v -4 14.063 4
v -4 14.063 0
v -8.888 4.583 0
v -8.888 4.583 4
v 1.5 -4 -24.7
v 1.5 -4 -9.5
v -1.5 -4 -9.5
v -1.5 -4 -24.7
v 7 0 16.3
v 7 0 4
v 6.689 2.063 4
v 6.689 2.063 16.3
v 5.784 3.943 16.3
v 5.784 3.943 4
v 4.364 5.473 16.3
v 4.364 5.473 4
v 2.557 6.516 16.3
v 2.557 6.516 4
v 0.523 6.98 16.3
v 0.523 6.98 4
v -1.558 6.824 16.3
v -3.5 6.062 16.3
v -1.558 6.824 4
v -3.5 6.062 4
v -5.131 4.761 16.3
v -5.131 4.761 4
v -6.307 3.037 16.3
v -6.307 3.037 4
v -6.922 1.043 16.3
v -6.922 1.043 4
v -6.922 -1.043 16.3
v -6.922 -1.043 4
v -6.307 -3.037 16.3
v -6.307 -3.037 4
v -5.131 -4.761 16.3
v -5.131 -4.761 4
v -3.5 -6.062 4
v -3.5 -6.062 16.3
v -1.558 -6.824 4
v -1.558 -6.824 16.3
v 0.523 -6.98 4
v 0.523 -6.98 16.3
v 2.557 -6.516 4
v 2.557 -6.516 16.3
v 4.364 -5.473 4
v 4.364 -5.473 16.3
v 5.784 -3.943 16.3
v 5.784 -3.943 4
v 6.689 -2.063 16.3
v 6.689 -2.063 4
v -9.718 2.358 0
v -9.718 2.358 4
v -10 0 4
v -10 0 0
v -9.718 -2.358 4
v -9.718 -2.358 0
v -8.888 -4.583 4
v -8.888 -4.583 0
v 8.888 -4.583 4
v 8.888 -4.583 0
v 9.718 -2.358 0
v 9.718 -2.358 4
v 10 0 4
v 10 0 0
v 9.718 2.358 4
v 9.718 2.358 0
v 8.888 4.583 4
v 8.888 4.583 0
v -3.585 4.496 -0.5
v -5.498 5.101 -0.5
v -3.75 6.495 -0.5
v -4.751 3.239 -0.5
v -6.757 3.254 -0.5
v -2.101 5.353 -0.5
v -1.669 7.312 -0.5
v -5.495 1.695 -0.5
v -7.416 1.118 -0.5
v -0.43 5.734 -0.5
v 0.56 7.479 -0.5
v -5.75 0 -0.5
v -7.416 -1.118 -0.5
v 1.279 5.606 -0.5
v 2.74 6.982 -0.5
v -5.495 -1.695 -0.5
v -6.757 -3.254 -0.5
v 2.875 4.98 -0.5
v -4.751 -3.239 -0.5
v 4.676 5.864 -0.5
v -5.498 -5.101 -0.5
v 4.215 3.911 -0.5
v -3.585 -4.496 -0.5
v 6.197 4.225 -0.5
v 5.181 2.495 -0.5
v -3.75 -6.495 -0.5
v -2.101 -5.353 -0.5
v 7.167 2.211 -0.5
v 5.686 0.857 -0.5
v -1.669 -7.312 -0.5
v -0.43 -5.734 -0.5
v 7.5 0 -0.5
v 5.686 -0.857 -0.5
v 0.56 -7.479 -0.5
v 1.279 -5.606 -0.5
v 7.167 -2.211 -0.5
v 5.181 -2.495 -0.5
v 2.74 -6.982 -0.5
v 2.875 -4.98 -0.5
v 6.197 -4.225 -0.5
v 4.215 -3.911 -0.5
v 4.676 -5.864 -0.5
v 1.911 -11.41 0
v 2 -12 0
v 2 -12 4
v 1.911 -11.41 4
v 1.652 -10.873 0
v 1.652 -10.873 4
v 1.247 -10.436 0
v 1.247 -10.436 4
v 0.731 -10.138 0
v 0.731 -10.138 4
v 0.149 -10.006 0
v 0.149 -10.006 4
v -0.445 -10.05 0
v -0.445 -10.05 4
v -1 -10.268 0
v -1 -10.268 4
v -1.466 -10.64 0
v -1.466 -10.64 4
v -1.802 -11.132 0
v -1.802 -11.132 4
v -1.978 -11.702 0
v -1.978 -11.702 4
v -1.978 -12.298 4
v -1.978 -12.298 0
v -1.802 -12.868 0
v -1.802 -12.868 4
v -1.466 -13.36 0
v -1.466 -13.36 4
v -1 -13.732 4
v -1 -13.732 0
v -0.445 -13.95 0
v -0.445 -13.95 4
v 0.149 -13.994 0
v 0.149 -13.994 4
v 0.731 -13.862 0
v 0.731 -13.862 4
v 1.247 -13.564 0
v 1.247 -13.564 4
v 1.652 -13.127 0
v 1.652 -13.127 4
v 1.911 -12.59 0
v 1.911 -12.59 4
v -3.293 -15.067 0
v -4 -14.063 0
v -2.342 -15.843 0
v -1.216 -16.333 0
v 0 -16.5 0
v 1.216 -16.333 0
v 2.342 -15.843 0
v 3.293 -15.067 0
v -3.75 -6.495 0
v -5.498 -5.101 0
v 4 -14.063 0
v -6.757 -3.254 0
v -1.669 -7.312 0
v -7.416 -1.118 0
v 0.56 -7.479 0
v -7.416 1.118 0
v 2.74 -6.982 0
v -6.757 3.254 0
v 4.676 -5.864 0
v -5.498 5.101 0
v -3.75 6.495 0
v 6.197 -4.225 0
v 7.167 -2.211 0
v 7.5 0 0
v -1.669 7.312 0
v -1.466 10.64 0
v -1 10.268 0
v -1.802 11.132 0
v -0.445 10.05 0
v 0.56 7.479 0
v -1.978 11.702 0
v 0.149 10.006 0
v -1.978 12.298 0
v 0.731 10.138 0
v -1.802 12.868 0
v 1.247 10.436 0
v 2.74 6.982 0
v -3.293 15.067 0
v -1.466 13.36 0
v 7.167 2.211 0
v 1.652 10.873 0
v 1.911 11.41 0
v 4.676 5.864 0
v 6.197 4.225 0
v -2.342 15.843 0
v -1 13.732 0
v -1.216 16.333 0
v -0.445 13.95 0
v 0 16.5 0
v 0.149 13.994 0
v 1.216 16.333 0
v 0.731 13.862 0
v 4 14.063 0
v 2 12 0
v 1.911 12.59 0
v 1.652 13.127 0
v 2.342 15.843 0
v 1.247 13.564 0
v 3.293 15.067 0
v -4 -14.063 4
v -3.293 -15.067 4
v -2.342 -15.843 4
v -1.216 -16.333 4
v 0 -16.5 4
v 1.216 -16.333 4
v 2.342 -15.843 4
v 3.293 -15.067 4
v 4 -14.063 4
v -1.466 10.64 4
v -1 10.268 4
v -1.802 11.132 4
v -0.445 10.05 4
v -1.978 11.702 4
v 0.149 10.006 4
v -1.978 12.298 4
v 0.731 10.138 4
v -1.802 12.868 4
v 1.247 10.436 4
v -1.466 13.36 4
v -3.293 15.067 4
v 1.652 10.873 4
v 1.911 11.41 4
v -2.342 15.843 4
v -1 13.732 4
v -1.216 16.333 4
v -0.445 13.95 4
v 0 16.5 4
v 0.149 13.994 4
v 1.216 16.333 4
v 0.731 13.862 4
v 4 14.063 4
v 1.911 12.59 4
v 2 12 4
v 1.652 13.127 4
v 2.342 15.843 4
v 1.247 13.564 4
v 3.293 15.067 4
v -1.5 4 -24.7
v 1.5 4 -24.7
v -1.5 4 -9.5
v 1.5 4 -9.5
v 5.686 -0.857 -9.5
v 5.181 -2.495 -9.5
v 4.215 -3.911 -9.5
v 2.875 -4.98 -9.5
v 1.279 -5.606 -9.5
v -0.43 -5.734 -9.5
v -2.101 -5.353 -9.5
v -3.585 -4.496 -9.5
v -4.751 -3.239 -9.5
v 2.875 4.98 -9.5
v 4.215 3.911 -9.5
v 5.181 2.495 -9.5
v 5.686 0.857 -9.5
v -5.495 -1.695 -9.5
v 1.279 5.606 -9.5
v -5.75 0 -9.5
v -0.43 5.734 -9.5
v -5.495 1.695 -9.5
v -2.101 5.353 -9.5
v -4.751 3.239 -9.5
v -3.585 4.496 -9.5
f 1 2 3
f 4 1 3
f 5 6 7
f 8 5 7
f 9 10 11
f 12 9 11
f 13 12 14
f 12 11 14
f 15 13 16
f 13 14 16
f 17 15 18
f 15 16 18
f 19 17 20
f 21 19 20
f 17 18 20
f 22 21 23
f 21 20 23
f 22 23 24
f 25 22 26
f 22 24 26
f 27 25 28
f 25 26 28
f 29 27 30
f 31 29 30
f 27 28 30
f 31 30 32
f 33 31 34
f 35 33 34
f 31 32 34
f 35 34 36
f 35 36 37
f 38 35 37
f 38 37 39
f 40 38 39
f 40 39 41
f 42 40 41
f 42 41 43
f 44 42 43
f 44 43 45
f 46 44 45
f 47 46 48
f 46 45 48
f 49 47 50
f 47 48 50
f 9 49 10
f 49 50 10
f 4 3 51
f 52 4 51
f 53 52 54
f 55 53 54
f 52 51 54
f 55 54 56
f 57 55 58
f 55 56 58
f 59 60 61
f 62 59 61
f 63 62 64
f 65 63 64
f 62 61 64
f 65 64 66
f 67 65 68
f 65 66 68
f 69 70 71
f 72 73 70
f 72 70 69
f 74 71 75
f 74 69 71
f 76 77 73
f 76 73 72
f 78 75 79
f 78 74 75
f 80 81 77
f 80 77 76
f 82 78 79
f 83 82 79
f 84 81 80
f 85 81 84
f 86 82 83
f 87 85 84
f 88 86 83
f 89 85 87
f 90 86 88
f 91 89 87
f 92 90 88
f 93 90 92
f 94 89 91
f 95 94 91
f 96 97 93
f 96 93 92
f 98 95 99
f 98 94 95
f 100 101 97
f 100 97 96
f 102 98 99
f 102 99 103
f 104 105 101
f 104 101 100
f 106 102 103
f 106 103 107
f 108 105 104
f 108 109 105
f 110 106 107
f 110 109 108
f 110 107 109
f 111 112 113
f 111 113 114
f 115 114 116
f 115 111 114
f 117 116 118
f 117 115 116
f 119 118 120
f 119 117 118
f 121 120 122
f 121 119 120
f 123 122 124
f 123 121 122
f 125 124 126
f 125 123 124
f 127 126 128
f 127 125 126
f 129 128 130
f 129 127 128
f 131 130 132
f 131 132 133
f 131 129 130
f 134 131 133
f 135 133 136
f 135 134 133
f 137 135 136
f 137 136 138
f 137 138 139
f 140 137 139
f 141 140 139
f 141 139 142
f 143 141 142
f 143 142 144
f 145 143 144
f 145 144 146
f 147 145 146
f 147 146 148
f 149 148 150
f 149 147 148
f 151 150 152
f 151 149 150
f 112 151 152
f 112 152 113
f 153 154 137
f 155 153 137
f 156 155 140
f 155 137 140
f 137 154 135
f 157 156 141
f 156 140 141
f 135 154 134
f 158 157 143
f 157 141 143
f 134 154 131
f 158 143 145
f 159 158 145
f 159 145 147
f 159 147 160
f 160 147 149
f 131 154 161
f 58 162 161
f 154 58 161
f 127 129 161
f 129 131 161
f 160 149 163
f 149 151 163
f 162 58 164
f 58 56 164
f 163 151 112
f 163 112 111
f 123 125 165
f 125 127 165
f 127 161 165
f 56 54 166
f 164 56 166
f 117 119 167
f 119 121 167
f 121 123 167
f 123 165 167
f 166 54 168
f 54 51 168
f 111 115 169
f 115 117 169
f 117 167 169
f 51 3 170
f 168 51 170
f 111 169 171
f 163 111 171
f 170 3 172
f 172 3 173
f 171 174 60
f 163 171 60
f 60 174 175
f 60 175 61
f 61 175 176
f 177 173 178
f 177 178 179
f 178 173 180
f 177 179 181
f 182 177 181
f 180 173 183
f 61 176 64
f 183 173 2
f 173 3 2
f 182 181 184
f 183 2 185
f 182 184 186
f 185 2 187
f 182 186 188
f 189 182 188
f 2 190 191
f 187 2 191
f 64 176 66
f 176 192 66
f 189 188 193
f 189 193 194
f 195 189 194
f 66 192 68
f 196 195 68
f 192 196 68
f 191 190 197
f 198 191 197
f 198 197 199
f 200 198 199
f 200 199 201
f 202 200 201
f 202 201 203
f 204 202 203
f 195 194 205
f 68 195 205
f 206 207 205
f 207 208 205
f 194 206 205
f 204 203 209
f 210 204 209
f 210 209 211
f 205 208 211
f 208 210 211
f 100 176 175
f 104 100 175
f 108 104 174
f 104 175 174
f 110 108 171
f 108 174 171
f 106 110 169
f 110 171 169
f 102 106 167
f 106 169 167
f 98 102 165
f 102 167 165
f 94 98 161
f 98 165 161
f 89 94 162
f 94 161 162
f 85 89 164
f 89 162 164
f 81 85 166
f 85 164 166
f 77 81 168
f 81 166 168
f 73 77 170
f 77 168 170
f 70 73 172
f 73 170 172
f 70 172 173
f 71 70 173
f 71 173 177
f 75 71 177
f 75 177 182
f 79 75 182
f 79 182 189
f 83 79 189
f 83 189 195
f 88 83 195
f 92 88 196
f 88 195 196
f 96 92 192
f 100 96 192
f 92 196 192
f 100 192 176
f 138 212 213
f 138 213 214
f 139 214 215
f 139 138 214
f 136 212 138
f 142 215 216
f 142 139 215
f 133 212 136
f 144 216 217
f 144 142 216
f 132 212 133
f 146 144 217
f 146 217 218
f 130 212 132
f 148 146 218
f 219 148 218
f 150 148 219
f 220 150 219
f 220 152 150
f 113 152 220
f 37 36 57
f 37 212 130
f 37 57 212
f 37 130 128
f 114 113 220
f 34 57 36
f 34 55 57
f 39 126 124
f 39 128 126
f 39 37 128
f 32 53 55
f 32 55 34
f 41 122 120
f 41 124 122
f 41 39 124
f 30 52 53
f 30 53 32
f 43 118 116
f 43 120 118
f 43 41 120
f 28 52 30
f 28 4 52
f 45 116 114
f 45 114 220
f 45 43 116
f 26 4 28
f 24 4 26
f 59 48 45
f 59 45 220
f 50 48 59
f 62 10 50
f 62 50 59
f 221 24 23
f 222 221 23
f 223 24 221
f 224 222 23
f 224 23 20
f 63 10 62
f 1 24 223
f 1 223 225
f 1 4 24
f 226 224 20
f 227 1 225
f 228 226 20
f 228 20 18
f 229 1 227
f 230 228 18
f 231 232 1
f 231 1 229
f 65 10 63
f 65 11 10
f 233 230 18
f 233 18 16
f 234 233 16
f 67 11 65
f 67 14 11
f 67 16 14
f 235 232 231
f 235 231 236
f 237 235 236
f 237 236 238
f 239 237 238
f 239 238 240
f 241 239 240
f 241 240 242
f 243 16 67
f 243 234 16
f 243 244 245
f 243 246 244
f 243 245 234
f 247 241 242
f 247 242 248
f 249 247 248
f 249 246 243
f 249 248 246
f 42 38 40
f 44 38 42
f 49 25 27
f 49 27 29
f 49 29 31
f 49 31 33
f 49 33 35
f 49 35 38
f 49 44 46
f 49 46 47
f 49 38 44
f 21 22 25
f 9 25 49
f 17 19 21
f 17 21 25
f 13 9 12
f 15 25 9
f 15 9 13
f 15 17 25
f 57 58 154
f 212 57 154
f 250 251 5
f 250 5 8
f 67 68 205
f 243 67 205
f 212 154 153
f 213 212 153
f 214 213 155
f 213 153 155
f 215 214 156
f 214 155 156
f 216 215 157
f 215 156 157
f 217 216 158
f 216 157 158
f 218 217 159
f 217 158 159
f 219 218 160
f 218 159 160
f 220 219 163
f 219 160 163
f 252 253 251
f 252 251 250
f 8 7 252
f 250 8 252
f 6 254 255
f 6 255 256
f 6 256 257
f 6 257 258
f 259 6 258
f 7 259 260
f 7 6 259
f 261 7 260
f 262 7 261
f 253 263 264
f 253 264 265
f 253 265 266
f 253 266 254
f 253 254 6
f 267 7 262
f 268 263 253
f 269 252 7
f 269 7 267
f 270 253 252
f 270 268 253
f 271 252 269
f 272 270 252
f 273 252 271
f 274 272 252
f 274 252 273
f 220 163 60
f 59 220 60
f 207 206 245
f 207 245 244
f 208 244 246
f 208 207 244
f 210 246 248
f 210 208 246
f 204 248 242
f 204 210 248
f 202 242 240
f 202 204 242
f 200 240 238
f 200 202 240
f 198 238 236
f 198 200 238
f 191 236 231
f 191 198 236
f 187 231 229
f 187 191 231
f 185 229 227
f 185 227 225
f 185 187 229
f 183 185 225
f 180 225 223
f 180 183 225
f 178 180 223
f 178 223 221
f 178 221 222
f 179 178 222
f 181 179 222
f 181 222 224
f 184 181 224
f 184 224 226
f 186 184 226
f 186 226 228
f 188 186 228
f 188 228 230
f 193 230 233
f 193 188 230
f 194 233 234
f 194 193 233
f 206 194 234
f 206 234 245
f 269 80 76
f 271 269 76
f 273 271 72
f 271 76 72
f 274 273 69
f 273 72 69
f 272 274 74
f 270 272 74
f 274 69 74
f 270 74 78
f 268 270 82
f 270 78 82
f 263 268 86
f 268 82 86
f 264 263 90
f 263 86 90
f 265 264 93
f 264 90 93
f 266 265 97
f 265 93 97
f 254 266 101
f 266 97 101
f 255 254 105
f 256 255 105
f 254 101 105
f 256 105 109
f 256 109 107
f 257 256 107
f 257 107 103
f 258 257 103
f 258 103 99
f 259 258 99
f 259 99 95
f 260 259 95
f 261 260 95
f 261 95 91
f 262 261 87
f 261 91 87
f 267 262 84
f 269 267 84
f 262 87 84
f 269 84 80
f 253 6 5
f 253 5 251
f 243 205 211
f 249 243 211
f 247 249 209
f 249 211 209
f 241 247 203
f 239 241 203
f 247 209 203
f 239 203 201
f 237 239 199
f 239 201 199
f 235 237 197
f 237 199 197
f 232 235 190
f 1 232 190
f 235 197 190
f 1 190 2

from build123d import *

# Parameters (mm, degrees)
SKETCH1_R           = 2
BOSS_EXTRUDE1_DEPTH = 4
SKETCH2_R           = 7
BOSS_EXTRUDE2_DEPTH = 12.3
SKETCH3_R           = 7.5
BOSS_EXTRUDE3_DEPTH = 0.5
SKETCH4_W           = 3
SKETCH4_H           = 8
BOSS_EXTRUDE4_DEPTH = 24.2
SKETCH5_R           = 5.75
BOSS_EXTRUDE5_DEPTH = 9


with BuildPart() as part:
    # Sketch1 → Boss-Extrude1 (new body)
    with BuildSketch(Plane.XY):
        with BuildLine():
            ThreePointArc((-3.999511648, -14.062500079), (-8.7e-08, -16.5), (3.999511568, -14.062500234))
            Line((3.999511568, -14.062500234), (8.887803753, -4.583333333))
            ThreePointArc((8.887803753, -4.583333333), (10, 0), (8.887803753, 4.583333333))
            Line((8.887803753, 4.583333333), (3.999511579, 14.062500214))
            ThreePointArc((3.999511579, 14.062500214), (-6.7e-08, 16.5), (-3.99951164, 14.062500095))
            Line((-3.99951164, 14.062500095), (-8.887803753, 4.583333333))
            ThreePointArc((-8.887803753, 4.583333333), (-10, 0), (-8.887803753, -4.583333333))
            Line((-8.887803753, -4.583333333), (-3.999511648, -14.062500079))
        make_face()
        with Locations((0, -12)):
            Circle(SKETCH1_R, mode=Mode.SUBTRACT)
        with Locations((0, 12)):
            Circle(SKETCH1_R, mode=Mode.SUBTRACT)
    extrude(amount=BOSS_EXTRUDE1_DEPTH)

    # Sketch2 → Boss-Extrude2 (add)
    with BuildSketch(Plane.XY.offset(4)):
        Circle(SKETCH2_R)
    extrude(amount=BOSS_EXTRUDE2_DEPTH)

    # Sketch3 → Boss-Extrude3 (add)
    with BuildSketch(Plane(origin=(0, 0, 0), x_dir=(-1, 0, 0), z_dir=(0, 0, -1))):
        with Locations(Location((0, 0, 0), (0, 0, 180))):
            Circle(SKETCH3_R)
    extrude(amount=BOSS_EXTRUDE3_DEPTH)

    # Sketch4 → Boss-Extrude4 (add)
    with BuildSketch(Plane(origin=(0, 0, -0.5), x_dir=(-1, 0, 0), z_dir=(0, 0, -1))):
        Rectangle(SKETCH4_W, SKETCH4_H)
    extrude(amount=BOSS_EXTRUDE4_DEPTH)

    # Sketch5 → Boss-Extrude5 (add)
    with BuildSketch(Plane(origin=(0, 0, -0.5), x_dir=(-1, 0, 0), z_dir=(0, 0, -1))):
        Circle(SKETCH5_R)
    extrude(amount=BOSS_EXTRUDE5_DEPTH)


solid = part.part
